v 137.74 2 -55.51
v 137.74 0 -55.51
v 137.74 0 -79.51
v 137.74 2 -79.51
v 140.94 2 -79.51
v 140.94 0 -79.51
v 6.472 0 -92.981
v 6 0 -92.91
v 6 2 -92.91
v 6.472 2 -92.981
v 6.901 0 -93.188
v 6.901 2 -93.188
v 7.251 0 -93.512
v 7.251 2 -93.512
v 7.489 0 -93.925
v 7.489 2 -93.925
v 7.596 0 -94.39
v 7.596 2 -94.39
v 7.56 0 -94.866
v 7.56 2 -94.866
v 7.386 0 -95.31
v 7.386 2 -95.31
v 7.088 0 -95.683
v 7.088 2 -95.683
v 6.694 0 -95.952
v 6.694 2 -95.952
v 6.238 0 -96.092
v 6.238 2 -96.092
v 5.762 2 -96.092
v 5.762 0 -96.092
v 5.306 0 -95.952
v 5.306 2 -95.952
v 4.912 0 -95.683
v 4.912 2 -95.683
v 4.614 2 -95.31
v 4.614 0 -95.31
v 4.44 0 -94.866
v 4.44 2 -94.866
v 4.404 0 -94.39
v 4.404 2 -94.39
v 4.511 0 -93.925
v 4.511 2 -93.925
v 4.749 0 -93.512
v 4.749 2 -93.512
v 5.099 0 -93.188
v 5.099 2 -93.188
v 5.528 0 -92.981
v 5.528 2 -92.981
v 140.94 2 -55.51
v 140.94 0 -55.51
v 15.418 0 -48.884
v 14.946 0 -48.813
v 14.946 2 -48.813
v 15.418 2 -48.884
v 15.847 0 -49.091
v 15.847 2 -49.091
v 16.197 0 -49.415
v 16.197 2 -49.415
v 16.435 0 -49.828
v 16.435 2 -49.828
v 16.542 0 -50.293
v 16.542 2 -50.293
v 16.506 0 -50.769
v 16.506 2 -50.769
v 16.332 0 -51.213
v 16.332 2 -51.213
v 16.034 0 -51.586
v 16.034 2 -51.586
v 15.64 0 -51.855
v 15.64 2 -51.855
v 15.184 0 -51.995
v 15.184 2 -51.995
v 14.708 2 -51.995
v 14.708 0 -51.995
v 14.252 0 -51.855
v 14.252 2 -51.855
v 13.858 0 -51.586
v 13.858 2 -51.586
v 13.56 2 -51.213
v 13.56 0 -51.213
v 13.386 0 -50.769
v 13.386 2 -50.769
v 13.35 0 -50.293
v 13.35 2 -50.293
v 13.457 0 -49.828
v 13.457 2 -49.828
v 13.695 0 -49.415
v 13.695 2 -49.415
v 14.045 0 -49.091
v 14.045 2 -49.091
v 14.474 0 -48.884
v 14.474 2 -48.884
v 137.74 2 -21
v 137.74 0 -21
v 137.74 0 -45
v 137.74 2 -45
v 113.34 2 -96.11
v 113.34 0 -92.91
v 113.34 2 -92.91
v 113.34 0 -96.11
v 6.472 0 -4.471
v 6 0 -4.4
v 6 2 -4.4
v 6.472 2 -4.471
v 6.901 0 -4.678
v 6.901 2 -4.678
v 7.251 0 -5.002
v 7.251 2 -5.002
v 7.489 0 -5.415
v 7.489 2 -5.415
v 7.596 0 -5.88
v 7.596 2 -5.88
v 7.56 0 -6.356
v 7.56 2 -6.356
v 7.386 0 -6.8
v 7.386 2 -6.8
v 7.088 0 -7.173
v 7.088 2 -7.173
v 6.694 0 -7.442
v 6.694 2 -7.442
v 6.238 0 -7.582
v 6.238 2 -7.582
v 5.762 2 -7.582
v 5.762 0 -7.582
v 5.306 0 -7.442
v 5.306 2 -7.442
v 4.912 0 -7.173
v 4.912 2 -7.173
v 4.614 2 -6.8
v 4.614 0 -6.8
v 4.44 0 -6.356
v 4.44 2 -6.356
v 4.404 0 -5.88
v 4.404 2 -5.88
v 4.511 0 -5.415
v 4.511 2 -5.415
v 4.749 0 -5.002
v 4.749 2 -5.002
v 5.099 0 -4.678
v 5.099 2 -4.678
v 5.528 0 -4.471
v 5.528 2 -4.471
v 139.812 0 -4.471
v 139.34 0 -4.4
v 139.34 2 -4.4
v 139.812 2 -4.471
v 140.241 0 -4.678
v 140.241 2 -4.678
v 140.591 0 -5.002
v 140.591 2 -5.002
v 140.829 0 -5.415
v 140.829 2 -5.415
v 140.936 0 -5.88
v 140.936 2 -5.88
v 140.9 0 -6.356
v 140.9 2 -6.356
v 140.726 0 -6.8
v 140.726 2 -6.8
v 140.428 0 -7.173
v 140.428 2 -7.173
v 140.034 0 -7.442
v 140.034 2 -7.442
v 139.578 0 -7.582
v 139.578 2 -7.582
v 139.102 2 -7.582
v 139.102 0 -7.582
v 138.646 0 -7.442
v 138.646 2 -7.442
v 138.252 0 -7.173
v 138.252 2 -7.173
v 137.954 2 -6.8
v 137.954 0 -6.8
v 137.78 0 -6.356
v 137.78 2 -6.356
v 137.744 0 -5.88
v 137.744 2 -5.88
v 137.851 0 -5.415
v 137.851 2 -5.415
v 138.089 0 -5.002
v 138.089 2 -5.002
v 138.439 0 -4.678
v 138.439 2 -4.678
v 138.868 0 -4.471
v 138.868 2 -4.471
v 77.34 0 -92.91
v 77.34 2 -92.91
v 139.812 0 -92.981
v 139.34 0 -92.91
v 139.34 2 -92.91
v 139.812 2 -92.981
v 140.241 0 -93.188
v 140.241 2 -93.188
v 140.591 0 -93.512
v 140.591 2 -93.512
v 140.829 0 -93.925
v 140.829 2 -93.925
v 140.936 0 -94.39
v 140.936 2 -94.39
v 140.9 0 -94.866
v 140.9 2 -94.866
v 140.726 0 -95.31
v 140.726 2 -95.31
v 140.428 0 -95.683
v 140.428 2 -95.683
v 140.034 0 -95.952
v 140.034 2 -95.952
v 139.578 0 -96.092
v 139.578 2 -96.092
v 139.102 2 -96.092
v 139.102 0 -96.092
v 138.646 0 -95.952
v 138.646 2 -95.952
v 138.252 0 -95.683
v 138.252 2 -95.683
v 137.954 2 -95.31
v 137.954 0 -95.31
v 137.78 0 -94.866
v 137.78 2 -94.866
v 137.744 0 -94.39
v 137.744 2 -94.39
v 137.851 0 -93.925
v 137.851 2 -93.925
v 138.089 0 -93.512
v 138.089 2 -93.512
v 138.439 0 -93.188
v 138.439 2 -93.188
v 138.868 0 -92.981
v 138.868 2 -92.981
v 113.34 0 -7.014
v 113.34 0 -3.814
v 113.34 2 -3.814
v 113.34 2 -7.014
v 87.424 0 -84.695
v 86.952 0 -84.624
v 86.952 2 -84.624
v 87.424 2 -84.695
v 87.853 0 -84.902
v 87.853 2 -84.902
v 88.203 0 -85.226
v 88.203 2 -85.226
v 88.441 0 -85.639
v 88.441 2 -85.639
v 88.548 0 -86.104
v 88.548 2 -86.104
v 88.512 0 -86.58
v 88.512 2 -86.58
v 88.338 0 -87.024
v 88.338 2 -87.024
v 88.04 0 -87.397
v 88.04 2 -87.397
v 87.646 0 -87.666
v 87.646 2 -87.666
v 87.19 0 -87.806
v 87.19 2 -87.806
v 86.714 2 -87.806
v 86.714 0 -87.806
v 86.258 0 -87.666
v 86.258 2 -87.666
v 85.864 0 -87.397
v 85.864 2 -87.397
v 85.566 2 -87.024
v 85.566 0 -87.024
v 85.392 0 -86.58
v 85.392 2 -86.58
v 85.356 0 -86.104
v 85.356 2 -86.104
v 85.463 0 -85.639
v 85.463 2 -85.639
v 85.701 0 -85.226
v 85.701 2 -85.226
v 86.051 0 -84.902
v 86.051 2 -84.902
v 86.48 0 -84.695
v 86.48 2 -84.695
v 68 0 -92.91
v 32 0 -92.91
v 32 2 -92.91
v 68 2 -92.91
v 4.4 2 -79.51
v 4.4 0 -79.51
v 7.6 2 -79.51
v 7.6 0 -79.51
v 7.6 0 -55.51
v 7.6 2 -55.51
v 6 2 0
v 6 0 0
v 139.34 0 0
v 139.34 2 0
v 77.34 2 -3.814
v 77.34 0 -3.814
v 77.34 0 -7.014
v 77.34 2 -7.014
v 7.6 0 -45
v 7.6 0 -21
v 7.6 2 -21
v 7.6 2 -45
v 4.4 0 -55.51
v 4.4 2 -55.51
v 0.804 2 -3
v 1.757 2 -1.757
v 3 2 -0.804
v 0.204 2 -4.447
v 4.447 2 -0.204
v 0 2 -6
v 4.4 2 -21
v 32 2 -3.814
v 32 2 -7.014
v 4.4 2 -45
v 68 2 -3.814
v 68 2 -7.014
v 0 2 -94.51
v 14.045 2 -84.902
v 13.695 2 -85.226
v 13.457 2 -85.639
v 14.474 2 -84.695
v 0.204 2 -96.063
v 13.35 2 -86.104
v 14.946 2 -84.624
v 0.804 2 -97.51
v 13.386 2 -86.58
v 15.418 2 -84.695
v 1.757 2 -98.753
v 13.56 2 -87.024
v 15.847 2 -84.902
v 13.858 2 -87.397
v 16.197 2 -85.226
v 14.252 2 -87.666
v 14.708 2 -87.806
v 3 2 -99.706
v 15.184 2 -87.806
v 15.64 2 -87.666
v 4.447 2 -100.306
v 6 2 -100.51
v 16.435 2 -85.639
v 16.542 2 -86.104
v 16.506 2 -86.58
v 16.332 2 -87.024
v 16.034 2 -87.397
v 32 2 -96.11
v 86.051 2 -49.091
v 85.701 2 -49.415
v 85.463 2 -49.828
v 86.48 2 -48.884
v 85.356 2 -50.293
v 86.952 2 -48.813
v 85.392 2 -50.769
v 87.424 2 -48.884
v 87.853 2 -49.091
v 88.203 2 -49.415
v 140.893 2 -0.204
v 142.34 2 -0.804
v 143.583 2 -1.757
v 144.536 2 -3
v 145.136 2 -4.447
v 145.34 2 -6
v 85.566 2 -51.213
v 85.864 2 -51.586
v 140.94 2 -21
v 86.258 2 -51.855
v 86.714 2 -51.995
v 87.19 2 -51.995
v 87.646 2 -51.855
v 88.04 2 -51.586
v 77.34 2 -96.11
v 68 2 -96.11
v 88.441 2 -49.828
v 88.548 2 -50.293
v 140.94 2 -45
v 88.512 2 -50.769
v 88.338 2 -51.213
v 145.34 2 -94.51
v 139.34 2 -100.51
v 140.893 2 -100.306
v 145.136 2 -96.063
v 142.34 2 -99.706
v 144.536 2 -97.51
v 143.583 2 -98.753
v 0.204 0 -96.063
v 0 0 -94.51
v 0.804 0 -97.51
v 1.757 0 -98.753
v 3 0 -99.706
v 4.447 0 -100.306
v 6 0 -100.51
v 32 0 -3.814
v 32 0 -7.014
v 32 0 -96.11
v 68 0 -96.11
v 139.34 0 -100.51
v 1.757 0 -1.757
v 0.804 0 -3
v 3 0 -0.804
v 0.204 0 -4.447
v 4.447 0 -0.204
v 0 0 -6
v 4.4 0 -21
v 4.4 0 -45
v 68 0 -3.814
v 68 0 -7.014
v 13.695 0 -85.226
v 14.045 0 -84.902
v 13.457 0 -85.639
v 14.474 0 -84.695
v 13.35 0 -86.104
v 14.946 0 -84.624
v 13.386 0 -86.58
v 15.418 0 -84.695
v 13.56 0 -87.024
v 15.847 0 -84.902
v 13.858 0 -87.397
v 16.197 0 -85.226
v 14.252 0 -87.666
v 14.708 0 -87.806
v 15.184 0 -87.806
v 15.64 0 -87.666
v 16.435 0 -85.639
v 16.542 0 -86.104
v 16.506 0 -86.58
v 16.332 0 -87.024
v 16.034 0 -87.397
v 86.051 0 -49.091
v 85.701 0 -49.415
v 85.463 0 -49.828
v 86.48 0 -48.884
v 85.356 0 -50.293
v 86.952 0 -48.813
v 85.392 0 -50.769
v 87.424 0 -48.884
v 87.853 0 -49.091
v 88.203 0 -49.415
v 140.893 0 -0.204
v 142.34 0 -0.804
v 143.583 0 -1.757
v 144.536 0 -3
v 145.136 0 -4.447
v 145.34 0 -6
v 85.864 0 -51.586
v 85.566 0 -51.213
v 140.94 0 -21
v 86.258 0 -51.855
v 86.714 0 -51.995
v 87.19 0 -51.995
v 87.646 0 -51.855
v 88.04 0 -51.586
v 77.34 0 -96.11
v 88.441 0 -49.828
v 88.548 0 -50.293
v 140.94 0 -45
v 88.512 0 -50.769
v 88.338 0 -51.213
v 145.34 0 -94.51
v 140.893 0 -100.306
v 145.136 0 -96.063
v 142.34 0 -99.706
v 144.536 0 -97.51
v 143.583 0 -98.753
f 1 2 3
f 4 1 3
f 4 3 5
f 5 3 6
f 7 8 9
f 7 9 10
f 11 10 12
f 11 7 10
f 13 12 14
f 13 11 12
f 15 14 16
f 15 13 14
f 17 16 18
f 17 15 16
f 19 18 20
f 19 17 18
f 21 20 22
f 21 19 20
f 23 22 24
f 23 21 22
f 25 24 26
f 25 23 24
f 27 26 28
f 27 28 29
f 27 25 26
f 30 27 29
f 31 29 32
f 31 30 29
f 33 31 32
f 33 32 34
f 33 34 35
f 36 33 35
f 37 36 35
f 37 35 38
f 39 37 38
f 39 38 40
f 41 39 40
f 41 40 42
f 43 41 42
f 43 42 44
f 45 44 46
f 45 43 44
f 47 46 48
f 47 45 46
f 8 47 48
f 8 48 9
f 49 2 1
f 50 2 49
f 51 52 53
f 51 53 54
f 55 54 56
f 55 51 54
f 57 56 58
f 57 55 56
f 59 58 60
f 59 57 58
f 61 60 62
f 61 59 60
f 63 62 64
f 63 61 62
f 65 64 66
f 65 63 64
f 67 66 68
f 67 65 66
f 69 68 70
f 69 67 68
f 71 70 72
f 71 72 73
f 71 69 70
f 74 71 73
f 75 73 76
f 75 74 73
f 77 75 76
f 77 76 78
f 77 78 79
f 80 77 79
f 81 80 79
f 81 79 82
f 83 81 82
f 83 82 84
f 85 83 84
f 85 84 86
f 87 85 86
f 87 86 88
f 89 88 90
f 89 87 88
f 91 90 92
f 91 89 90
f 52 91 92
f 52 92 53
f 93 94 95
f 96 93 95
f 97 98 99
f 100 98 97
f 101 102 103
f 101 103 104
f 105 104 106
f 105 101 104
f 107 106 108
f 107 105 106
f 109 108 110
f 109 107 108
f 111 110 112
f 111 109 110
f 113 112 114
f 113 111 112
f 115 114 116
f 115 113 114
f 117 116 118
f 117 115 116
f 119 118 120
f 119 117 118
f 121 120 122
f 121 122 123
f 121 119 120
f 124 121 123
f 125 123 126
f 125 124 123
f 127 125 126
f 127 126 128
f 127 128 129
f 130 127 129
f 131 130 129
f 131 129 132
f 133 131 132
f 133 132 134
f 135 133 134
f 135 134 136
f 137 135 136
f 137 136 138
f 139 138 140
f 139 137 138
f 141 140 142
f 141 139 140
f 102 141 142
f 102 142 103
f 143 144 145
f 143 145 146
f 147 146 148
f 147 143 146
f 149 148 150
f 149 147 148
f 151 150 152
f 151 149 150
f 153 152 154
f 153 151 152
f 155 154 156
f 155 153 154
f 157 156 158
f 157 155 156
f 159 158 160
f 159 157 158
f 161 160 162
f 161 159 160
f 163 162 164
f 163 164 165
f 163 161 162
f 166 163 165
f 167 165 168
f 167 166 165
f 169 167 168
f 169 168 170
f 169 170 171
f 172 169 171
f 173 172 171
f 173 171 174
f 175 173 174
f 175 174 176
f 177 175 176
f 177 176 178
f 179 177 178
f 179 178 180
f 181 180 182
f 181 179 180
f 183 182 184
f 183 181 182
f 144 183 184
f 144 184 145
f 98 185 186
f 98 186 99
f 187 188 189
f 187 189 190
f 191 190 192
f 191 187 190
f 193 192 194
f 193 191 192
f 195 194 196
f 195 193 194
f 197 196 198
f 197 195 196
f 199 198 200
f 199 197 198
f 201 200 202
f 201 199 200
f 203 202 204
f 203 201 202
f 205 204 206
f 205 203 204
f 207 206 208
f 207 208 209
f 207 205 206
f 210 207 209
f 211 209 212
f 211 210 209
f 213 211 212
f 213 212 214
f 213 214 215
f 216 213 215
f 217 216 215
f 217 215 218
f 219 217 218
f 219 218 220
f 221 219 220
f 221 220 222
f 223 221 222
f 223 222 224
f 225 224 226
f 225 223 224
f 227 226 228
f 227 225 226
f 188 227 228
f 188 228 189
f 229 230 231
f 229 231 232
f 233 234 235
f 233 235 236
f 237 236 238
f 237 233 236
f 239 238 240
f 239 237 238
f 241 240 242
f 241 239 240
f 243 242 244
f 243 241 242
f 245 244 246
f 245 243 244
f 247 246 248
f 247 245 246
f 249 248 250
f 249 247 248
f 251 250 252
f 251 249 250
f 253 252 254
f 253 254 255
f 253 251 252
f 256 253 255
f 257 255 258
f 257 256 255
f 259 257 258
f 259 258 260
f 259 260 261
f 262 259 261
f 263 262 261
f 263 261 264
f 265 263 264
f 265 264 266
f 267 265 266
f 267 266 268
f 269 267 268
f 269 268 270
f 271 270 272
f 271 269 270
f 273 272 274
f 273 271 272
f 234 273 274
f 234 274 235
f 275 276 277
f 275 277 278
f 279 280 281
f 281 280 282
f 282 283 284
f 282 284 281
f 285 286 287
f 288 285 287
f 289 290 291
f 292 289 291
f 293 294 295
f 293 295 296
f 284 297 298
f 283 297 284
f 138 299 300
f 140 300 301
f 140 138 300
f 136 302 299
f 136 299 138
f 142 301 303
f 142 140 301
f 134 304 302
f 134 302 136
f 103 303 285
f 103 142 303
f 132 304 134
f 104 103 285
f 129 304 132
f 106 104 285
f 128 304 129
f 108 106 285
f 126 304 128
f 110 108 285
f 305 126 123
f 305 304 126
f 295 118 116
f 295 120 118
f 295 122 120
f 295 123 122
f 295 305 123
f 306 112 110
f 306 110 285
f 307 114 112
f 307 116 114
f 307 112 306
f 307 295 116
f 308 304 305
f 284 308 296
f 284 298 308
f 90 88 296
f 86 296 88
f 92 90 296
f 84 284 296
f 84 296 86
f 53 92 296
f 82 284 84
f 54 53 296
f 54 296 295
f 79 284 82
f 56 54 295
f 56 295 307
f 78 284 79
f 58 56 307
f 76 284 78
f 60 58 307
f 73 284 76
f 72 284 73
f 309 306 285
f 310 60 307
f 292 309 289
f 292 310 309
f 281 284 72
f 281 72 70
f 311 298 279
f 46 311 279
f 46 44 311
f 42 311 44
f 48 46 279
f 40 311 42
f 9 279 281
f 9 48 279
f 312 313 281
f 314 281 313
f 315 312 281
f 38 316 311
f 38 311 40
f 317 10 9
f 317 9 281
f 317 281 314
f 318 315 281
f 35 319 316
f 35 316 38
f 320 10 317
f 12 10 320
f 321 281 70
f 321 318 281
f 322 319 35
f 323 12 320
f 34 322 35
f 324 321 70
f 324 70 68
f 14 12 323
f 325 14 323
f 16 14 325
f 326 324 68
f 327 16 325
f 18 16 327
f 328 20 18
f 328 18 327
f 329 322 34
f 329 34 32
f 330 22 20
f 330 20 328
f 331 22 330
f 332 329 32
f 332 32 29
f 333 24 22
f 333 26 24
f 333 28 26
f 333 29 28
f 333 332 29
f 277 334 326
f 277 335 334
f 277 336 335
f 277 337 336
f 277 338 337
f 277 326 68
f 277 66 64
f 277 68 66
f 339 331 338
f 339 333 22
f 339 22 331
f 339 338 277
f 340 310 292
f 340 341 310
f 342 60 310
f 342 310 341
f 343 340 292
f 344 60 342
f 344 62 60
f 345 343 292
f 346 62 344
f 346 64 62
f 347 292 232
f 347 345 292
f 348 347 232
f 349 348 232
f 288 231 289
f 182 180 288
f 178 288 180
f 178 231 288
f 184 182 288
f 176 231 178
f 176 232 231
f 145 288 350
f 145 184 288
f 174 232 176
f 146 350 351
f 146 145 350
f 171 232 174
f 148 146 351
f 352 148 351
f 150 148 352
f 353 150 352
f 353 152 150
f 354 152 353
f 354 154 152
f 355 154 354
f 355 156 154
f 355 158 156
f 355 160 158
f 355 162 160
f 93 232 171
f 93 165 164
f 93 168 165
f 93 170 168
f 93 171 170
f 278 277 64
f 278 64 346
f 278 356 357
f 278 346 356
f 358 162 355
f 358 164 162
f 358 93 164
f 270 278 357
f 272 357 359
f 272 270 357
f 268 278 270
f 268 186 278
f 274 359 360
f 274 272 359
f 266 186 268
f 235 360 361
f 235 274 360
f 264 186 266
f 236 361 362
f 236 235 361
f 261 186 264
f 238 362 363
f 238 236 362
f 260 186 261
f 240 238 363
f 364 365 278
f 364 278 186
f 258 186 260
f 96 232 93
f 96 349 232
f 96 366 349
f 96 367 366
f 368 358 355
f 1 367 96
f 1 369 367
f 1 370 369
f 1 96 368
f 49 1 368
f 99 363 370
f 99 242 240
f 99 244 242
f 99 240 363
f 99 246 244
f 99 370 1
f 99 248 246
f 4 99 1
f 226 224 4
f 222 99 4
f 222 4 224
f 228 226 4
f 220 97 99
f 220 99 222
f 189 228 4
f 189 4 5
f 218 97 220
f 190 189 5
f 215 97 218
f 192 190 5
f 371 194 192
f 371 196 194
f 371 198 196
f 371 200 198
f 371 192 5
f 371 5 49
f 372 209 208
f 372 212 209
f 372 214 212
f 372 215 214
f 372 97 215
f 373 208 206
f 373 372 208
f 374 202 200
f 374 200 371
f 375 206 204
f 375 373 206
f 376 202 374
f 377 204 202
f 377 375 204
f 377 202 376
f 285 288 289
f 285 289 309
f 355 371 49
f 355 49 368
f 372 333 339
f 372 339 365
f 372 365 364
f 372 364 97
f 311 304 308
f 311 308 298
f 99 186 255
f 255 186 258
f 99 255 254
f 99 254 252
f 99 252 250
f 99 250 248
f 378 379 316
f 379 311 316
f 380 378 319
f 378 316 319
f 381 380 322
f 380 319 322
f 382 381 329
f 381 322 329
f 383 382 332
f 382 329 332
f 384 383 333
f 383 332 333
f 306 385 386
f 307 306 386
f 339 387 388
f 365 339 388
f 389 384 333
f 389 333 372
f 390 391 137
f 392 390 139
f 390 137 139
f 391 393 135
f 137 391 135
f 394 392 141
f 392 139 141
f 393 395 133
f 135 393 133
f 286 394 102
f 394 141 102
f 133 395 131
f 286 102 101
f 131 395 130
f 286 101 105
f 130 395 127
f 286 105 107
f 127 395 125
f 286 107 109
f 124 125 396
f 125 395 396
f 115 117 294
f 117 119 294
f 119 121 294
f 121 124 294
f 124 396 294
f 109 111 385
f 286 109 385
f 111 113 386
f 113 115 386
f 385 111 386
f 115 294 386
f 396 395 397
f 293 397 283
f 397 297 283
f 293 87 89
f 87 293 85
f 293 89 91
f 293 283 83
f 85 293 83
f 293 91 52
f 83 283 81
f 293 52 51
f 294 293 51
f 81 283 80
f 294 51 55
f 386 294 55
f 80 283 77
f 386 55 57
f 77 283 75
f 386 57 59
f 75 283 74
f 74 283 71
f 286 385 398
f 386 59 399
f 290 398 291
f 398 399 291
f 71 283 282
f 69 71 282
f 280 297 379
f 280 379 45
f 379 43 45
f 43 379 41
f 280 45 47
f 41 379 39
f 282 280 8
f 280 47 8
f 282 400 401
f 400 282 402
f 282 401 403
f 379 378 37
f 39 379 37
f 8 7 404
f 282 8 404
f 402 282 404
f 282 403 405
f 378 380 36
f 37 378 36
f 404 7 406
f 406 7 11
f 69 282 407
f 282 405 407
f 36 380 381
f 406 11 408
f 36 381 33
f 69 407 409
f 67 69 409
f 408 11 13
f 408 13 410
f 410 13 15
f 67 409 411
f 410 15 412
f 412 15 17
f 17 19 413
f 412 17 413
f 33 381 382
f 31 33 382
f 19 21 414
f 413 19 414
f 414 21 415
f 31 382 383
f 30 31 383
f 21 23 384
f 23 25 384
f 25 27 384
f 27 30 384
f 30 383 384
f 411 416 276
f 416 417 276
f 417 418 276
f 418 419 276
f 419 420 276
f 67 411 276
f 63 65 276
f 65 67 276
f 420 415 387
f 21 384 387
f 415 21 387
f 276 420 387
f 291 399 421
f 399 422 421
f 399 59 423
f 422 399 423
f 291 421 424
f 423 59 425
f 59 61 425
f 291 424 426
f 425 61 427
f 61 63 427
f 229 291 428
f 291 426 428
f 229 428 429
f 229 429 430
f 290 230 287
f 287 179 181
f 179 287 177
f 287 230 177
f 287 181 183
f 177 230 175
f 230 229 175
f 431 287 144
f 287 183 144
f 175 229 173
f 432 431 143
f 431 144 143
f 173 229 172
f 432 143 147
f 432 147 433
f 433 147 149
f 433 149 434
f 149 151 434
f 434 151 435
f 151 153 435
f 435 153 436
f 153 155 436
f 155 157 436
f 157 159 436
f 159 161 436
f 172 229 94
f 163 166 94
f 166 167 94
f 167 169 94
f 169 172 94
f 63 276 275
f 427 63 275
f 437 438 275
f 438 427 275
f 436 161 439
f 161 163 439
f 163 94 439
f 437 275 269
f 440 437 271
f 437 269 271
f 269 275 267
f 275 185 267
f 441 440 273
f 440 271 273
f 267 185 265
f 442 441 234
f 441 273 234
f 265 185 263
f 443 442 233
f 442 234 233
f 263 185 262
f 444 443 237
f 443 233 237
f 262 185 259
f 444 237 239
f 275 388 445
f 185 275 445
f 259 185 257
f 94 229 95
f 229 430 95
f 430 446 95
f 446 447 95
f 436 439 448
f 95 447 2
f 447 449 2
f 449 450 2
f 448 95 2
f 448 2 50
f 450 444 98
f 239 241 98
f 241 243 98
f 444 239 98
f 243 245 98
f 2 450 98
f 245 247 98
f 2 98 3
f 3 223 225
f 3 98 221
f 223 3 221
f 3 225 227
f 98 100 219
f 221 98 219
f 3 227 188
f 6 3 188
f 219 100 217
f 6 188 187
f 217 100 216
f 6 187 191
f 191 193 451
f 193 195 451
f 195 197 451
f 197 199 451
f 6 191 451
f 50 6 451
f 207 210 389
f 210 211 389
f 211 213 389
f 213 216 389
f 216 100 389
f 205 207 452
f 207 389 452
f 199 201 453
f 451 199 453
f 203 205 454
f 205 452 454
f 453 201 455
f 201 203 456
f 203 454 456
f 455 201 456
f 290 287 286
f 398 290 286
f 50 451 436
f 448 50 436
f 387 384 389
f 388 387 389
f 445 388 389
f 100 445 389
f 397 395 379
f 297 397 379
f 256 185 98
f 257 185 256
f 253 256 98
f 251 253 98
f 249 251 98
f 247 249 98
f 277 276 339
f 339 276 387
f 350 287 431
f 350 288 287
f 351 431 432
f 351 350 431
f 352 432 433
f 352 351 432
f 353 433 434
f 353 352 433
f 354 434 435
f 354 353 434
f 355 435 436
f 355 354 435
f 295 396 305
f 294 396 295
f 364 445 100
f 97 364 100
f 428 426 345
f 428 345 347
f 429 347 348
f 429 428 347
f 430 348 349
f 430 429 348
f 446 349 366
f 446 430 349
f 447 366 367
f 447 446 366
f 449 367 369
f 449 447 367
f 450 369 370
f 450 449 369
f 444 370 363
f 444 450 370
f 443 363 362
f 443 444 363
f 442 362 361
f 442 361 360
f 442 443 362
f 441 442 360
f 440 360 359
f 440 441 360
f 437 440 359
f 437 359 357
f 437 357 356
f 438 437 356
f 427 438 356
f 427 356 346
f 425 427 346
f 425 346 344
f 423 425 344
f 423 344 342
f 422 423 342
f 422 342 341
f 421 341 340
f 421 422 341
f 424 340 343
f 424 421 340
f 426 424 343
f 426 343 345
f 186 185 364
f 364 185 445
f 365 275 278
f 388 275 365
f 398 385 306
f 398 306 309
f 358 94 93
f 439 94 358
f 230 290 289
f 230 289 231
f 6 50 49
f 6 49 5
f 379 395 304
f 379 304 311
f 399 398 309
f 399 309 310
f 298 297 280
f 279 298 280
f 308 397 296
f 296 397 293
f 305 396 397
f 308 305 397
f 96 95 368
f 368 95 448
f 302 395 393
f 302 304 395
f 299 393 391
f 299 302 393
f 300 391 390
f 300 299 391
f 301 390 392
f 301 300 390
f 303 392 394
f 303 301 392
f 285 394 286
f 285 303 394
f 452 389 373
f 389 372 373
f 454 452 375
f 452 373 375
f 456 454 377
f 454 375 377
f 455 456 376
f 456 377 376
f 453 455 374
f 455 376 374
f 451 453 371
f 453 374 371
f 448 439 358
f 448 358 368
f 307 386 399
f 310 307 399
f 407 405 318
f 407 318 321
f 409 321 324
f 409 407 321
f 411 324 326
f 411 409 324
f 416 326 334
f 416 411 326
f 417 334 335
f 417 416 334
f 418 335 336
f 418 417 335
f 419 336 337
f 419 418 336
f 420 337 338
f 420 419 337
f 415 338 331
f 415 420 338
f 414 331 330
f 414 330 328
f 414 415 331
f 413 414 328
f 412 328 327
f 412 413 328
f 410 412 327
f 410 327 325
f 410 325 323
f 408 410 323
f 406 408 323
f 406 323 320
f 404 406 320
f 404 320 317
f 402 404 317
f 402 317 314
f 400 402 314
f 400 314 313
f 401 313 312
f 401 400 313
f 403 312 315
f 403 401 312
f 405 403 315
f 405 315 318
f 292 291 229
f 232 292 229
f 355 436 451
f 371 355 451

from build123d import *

# Parameters (mm, degrees)
SKETCH1_W           = 145.34
SKETCH1_H           = 100.51
SKETCH1_R           = 1.6
SKETCH1_W_2         = 36
SKETCH1_H_2         = 3.2
SKETCH1_W_3         = 3.2
SKETCH1_H_3         = 24
BOSS_EXTRUDE1_DEPTH = 2
FILLET1_R           = 6
FILLET2_R           = 6
FILLET3_R           = 6


with BuildPart() as part:
    # Sketch1 → Boss-Extrude1 (new body)
    with BuildSketch(Plane(origin=(0, 0, 0), x_dir=(1, 0, 0), z_dir=(0, 1, 0))):
        with Locations((72.67, 50.255)):
            Rectangle(SKETCH1_W, SKETCH1_H)
        with Locations(Location((14.946, 86.224, 0), (0, 0, 270))):
            Circle(SKETCH1_R, mode=Mode.SUBTRACT)
        with Locations(Location((86.952, 86.224, 0), (0, 0, 270))):
            Circle(SKETCH1_R, mode=Mode.SUBTRACT)
        with Locations(Location((86.952, 50.413, 0), (0, 0, 270))):
            Circle(SKETCH1_R, mode=Mode.SUBTRACT)
        with Locations(Location((14.946, 50.413, 0), (0, 0, 270))):
            Circle(SKETCH1_R, mode=Mode.SUBTRACT)
        with Locations(Location((6, 94.51, 0), (0, 0, 270))):
            Circle(SKETCH1_R, mode=Mode.SUBTRACT)
        with Locations(Location((139.34, 94.51, 0), (0, 0, 270))):
            Circle(SKETCH1_R, mode=Mode.SUBTRACT)
        with Locations(Location((139.34, 6, 0), (0, 0, 270))):
            Circle(SKETCH1_R, mode=Mode.SUBTRACT)
        with Locations(Location((6, 6, 0), (0, 0, 270))):
            Circle(SKETCH1_R, mode=Mode.SUBTRACT)
        with Locations((50, 5.414130674)):
            Rectangle(SKETCH1_W_2, SKETCH1_H_2, mode=Mode.SUBTRACT)
        with Locations((50, 94.51)):
            Rectangle(SKETCH1_W_2, SKETCH1_H_2, mode=Mode.SUBTRACT)
        with Locations((95.34, 94.51)):
            Rectangle(SKETCH1_W_2, SKETCH1_H_2, mode=Mode.SUBTRACT)
        with Locations((95.34, 5.414130674)):
            Rectangle(SKETCH1_W_2, SKETCH1_H_2, mode=Mode.SUBTRACT)
        with Locations((6, 67.51)):
            Rectangle(SKETCH1_W_3, SKETCH1_H_3, mode=Mode.SUBTRACT)
        with Locations((6, 33)):
            Rectangle(SKETCH1_W_3, SKETCH1_H_3, mode=Mode.SUBTRACT)
        with Locations((139.34, 67.51)):
            Rectangle(SKETCH1_W_3, SKETCH1_H_3, mode=Mode.SUBTRACT)
        with Locations((139.34, 33)):
            Rectangle(SKETCH1_W_3, SKETCH1_H_3, mode=Mode.SUBTRACT)
    extrude(amount=BOSS_EXTRUDE1_DEPTH)

    # Fillet1
    fillet1_edges = [part.edges().sort_by_distance(p)[0] for p in [
        (0, 1, -100.51),
    ]]
    fillet(fillet1_edges, radius=FILLET1_R)

    # Fillet2
    fillet2_edges = [part.edges().sort_by_distance(p)[0] for p in [
        (0, 1, 0),
    ]]
    fillet(fillet2_edges, radius=FILLET2_R)

    # Fillet3
    fillet3_edges = [part.edges().sort_by_distance(p)[0] for p in [
        (145.34, 1, -100.51),
        (145.34, 1, 0),
    ]]
    fillet(fillet3_edges, radius=FILLET3_R)


solid = part.part
